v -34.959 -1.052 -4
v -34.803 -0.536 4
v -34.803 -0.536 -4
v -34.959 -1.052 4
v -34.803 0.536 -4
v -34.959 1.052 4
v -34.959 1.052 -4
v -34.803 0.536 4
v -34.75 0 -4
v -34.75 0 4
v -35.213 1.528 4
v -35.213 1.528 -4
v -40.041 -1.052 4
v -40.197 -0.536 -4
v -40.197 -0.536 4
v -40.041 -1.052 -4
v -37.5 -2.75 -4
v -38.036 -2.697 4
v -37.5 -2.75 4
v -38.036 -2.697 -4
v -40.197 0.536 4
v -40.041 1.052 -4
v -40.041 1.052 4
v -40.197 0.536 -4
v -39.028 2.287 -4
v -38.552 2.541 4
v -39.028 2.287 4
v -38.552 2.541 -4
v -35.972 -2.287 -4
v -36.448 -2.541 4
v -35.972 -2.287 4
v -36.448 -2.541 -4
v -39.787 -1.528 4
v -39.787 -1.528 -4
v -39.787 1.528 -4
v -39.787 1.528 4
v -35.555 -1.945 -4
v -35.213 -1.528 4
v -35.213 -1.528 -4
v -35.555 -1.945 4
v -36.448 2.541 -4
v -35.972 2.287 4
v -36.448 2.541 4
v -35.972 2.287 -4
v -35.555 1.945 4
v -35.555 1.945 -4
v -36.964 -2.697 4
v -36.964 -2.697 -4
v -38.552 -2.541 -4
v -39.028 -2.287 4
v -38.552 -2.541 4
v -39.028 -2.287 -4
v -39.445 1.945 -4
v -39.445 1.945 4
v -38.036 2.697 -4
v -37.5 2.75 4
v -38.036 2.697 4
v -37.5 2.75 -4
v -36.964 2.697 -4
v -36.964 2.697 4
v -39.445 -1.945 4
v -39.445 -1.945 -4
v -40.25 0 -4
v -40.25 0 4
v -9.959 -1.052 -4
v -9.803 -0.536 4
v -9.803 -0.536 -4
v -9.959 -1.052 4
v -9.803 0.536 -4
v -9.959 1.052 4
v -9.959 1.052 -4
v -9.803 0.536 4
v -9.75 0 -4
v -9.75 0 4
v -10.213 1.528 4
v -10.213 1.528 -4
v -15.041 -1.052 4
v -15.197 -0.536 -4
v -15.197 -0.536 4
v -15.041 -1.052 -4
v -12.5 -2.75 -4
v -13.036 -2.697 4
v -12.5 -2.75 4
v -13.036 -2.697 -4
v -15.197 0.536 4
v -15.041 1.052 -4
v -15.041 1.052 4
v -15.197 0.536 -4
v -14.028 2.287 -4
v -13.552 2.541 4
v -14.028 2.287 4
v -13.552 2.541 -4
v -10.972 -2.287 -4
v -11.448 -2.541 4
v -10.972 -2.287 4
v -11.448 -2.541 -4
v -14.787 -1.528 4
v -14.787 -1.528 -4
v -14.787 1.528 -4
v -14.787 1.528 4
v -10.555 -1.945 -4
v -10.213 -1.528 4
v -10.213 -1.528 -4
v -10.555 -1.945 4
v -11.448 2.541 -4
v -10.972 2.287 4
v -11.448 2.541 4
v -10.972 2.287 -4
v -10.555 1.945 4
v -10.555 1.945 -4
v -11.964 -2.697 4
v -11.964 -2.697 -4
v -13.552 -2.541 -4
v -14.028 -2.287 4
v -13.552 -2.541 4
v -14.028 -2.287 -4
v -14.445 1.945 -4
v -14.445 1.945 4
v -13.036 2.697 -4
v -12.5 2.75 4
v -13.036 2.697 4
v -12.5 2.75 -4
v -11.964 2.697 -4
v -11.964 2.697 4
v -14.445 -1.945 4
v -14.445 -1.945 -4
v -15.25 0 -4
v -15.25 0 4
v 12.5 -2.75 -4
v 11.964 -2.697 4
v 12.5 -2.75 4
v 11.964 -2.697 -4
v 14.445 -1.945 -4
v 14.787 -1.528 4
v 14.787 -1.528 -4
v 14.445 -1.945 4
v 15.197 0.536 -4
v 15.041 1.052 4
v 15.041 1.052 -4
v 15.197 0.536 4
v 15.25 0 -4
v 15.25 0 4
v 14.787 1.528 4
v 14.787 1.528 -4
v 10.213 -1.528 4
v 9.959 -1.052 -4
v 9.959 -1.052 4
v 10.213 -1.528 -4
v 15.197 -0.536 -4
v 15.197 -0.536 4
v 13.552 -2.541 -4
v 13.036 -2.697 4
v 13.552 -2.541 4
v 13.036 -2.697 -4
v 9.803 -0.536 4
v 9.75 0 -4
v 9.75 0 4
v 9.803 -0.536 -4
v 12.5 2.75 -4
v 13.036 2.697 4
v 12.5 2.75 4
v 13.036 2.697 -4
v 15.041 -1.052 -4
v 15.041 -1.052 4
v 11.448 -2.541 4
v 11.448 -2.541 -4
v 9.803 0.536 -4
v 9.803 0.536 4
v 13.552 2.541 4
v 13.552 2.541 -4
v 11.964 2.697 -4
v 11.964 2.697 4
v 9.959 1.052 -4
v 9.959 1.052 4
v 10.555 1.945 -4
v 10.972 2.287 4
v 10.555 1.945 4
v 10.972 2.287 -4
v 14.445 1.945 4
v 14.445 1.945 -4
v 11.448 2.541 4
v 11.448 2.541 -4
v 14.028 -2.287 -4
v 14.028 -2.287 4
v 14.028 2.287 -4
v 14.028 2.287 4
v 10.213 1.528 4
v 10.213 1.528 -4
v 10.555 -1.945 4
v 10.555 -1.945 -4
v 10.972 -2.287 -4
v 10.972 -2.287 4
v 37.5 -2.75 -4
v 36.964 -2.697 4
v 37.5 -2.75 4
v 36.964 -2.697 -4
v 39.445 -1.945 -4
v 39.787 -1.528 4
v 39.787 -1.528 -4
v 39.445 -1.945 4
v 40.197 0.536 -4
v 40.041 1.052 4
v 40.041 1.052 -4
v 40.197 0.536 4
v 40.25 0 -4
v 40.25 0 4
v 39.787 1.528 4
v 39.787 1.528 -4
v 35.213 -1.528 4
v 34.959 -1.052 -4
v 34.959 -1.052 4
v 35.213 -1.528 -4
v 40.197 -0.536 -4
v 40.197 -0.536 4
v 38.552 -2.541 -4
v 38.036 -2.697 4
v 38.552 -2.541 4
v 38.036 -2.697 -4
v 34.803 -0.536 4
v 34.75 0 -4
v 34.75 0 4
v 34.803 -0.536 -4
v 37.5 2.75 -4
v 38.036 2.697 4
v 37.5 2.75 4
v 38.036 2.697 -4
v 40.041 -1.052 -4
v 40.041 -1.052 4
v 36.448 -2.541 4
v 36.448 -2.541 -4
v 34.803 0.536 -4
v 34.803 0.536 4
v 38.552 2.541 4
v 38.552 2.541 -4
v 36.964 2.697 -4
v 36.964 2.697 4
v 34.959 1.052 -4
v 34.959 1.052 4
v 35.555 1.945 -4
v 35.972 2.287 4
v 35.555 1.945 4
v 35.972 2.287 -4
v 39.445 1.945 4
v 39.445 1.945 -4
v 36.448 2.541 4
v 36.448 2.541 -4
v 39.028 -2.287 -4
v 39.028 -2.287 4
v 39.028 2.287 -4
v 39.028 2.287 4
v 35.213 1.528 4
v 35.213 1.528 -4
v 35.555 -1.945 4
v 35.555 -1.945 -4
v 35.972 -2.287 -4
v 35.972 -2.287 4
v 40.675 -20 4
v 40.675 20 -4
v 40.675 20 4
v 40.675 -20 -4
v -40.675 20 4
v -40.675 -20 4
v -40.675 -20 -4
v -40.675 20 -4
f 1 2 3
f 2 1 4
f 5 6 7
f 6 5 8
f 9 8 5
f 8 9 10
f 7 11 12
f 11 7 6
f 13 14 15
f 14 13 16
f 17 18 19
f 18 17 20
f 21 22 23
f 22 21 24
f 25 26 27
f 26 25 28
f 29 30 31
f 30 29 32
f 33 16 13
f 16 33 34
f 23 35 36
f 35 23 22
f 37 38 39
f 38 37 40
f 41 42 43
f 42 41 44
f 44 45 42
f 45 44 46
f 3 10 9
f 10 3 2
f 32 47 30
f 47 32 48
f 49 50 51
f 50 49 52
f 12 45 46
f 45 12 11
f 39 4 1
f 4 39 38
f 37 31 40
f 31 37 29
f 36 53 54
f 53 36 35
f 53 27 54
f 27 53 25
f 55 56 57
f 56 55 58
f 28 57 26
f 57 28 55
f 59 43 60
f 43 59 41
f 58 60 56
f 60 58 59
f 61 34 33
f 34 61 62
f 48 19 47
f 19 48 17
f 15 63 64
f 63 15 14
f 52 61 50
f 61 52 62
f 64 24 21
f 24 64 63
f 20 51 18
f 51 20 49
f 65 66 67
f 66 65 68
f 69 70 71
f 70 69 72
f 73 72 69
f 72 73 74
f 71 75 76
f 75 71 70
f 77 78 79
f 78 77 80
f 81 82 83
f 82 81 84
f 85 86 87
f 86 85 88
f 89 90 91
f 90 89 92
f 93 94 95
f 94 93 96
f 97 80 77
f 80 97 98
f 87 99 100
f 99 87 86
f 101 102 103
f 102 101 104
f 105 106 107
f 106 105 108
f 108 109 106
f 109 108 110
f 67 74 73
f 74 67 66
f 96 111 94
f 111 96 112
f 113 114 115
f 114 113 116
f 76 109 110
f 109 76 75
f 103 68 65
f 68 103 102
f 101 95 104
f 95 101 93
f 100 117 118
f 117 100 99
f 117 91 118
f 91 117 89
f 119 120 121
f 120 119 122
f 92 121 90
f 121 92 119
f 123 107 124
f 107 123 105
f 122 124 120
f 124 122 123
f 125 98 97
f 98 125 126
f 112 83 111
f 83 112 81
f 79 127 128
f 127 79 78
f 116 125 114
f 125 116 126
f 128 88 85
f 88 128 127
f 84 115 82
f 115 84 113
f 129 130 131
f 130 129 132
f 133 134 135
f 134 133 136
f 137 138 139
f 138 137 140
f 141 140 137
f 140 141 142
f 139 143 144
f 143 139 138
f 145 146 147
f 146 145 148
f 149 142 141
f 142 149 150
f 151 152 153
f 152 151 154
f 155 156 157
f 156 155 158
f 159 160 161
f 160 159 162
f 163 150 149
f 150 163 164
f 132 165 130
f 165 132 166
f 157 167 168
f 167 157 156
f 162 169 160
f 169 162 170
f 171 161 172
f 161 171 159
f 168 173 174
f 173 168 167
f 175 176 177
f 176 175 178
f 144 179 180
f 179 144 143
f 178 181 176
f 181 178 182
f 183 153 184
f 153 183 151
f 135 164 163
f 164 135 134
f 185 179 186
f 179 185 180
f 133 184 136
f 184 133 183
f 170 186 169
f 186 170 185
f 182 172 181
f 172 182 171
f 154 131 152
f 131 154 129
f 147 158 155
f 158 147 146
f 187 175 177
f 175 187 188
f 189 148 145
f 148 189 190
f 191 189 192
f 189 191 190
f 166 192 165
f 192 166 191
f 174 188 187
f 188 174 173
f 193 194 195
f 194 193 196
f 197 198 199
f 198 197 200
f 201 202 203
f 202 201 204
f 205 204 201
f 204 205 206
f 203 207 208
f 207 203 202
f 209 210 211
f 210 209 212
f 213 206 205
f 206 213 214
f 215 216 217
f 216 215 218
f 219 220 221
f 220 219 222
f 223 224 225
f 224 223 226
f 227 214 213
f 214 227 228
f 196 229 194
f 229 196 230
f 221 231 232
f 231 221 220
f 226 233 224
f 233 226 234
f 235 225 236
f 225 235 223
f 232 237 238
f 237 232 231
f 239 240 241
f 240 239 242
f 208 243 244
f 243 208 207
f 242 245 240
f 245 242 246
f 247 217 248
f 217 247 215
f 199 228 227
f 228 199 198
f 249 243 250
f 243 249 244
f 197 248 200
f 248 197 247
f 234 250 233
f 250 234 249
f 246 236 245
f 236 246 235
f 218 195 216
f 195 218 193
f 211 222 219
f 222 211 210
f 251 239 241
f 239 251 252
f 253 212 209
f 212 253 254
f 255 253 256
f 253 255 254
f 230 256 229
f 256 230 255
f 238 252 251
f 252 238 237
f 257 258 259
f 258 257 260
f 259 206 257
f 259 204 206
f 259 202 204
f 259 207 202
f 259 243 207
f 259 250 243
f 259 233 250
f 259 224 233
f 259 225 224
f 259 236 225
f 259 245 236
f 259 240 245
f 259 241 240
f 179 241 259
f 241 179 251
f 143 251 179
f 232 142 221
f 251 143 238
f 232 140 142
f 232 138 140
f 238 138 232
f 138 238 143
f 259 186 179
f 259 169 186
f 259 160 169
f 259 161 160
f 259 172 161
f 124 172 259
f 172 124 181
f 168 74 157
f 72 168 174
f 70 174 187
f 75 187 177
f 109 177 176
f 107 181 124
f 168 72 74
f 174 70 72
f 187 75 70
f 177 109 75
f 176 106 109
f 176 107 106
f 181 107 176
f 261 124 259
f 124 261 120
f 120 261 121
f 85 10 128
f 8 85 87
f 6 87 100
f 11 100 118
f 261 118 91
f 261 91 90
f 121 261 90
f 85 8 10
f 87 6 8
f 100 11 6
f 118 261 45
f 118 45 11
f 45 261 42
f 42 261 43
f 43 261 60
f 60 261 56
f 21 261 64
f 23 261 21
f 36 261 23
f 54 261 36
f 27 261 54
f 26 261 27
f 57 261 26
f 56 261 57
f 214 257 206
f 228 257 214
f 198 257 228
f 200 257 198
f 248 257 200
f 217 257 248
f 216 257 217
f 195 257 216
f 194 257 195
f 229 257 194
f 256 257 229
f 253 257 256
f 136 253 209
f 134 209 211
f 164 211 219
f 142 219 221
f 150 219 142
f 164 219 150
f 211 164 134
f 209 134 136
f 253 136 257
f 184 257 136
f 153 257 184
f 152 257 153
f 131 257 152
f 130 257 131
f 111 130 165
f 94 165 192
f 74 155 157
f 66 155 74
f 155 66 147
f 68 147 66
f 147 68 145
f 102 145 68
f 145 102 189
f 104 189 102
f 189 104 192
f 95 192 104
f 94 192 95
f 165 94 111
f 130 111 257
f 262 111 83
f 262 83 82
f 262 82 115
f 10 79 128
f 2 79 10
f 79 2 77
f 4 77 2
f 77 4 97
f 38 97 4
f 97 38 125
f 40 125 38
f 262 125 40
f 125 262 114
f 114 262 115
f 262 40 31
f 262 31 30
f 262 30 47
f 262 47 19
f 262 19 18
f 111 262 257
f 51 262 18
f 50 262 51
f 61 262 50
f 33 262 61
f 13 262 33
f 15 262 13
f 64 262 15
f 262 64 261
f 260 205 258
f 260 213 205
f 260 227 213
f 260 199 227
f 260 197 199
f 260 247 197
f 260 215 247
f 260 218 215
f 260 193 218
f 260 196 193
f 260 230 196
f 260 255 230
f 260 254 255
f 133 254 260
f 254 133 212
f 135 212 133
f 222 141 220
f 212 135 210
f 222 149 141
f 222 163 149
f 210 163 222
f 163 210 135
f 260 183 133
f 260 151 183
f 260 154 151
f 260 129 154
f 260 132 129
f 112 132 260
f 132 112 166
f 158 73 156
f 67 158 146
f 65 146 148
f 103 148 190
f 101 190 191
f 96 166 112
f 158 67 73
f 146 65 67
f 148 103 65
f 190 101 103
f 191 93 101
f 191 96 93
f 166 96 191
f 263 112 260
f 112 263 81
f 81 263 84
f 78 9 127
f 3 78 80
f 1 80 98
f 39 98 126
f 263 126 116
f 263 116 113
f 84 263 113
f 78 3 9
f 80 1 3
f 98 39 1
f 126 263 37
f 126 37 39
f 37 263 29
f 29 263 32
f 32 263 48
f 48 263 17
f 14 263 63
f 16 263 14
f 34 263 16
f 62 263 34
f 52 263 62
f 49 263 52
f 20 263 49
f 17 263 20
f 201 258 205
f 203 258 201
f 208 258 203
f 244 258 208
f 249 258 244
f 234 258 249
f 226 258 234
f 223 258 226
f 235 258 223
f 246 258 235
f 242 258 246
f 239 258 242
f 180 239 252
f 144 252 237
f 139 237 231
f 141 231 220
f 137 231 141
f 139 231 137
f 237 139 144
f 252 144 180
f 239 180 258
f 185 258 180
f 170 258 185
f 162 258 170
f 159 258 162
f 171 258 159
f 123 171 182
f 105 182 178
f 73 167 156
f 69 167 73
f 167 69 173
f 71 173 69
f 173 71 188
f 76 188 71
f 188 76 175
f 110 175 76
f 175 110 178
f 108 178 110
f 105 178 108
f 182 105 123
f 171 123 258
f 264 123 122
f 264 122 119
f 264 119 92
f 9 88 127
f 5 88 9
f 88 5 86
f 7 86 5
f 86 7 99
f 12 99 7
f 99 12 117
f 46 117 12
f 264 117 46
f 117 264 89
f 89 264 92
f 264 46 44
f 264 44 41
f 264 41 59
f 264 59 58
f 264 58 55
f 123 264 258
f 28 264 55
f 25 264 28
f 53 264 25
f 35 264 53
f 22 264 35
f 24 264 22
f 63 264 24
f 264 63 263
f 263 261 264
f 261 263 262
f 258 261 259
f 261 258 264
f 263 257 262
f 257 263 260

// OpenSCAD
$fn = 32;

// ----------------------------------------------------------------------
// Hole bar, 4 x Ø5.5
// skip layout, 3.175 mm edge offset
// ----------------------------------------------------------------------

// --- parameters (mm) ---
bar_w = 40;         // bar width (Y)
bar_t = 8;          // bar thickness (Z)
holes = 4;          // holes per row
hole_d = 5.5;       // hole diameter
edge = 3.175;       // offset from the bar end to the first hole
grid_pitch = 12.5;  // grid the bar was laid out on

// --- derived feature positions (mm) ---
pitch = grid_pitch * 2;       // = 25   holes sit every other grid slot
span = (holes - 1) * pitch;   // = 75   distance between the end holes
bar_l = span + 2 * edge;      // = 81.35   overall bar length
start_x = -bar_l / 2 + edge;  // = -37.5   X of the first hole
feature_centers = [
  [start_x + 0 * pitch, 0],
  [start_x + 1 * pitch, 0],
  [start_x + 2 * pitch, 0],
  [start_x + 3 * pitch, 0]
];   // hole centres of the first row

// bar with one row of holes, drilled from feature_centers
difference() {
  translate([-bar_l / 2, -bar_w / 2, -bar_t / 2]) cube([bar_l, bar_w, bar_t]);
  for (centre = feature_centers)
    translate([centre[0], centre[1], 0])
      cylinder(d = hole_d, h = bar_t + 2, center = true);
}
